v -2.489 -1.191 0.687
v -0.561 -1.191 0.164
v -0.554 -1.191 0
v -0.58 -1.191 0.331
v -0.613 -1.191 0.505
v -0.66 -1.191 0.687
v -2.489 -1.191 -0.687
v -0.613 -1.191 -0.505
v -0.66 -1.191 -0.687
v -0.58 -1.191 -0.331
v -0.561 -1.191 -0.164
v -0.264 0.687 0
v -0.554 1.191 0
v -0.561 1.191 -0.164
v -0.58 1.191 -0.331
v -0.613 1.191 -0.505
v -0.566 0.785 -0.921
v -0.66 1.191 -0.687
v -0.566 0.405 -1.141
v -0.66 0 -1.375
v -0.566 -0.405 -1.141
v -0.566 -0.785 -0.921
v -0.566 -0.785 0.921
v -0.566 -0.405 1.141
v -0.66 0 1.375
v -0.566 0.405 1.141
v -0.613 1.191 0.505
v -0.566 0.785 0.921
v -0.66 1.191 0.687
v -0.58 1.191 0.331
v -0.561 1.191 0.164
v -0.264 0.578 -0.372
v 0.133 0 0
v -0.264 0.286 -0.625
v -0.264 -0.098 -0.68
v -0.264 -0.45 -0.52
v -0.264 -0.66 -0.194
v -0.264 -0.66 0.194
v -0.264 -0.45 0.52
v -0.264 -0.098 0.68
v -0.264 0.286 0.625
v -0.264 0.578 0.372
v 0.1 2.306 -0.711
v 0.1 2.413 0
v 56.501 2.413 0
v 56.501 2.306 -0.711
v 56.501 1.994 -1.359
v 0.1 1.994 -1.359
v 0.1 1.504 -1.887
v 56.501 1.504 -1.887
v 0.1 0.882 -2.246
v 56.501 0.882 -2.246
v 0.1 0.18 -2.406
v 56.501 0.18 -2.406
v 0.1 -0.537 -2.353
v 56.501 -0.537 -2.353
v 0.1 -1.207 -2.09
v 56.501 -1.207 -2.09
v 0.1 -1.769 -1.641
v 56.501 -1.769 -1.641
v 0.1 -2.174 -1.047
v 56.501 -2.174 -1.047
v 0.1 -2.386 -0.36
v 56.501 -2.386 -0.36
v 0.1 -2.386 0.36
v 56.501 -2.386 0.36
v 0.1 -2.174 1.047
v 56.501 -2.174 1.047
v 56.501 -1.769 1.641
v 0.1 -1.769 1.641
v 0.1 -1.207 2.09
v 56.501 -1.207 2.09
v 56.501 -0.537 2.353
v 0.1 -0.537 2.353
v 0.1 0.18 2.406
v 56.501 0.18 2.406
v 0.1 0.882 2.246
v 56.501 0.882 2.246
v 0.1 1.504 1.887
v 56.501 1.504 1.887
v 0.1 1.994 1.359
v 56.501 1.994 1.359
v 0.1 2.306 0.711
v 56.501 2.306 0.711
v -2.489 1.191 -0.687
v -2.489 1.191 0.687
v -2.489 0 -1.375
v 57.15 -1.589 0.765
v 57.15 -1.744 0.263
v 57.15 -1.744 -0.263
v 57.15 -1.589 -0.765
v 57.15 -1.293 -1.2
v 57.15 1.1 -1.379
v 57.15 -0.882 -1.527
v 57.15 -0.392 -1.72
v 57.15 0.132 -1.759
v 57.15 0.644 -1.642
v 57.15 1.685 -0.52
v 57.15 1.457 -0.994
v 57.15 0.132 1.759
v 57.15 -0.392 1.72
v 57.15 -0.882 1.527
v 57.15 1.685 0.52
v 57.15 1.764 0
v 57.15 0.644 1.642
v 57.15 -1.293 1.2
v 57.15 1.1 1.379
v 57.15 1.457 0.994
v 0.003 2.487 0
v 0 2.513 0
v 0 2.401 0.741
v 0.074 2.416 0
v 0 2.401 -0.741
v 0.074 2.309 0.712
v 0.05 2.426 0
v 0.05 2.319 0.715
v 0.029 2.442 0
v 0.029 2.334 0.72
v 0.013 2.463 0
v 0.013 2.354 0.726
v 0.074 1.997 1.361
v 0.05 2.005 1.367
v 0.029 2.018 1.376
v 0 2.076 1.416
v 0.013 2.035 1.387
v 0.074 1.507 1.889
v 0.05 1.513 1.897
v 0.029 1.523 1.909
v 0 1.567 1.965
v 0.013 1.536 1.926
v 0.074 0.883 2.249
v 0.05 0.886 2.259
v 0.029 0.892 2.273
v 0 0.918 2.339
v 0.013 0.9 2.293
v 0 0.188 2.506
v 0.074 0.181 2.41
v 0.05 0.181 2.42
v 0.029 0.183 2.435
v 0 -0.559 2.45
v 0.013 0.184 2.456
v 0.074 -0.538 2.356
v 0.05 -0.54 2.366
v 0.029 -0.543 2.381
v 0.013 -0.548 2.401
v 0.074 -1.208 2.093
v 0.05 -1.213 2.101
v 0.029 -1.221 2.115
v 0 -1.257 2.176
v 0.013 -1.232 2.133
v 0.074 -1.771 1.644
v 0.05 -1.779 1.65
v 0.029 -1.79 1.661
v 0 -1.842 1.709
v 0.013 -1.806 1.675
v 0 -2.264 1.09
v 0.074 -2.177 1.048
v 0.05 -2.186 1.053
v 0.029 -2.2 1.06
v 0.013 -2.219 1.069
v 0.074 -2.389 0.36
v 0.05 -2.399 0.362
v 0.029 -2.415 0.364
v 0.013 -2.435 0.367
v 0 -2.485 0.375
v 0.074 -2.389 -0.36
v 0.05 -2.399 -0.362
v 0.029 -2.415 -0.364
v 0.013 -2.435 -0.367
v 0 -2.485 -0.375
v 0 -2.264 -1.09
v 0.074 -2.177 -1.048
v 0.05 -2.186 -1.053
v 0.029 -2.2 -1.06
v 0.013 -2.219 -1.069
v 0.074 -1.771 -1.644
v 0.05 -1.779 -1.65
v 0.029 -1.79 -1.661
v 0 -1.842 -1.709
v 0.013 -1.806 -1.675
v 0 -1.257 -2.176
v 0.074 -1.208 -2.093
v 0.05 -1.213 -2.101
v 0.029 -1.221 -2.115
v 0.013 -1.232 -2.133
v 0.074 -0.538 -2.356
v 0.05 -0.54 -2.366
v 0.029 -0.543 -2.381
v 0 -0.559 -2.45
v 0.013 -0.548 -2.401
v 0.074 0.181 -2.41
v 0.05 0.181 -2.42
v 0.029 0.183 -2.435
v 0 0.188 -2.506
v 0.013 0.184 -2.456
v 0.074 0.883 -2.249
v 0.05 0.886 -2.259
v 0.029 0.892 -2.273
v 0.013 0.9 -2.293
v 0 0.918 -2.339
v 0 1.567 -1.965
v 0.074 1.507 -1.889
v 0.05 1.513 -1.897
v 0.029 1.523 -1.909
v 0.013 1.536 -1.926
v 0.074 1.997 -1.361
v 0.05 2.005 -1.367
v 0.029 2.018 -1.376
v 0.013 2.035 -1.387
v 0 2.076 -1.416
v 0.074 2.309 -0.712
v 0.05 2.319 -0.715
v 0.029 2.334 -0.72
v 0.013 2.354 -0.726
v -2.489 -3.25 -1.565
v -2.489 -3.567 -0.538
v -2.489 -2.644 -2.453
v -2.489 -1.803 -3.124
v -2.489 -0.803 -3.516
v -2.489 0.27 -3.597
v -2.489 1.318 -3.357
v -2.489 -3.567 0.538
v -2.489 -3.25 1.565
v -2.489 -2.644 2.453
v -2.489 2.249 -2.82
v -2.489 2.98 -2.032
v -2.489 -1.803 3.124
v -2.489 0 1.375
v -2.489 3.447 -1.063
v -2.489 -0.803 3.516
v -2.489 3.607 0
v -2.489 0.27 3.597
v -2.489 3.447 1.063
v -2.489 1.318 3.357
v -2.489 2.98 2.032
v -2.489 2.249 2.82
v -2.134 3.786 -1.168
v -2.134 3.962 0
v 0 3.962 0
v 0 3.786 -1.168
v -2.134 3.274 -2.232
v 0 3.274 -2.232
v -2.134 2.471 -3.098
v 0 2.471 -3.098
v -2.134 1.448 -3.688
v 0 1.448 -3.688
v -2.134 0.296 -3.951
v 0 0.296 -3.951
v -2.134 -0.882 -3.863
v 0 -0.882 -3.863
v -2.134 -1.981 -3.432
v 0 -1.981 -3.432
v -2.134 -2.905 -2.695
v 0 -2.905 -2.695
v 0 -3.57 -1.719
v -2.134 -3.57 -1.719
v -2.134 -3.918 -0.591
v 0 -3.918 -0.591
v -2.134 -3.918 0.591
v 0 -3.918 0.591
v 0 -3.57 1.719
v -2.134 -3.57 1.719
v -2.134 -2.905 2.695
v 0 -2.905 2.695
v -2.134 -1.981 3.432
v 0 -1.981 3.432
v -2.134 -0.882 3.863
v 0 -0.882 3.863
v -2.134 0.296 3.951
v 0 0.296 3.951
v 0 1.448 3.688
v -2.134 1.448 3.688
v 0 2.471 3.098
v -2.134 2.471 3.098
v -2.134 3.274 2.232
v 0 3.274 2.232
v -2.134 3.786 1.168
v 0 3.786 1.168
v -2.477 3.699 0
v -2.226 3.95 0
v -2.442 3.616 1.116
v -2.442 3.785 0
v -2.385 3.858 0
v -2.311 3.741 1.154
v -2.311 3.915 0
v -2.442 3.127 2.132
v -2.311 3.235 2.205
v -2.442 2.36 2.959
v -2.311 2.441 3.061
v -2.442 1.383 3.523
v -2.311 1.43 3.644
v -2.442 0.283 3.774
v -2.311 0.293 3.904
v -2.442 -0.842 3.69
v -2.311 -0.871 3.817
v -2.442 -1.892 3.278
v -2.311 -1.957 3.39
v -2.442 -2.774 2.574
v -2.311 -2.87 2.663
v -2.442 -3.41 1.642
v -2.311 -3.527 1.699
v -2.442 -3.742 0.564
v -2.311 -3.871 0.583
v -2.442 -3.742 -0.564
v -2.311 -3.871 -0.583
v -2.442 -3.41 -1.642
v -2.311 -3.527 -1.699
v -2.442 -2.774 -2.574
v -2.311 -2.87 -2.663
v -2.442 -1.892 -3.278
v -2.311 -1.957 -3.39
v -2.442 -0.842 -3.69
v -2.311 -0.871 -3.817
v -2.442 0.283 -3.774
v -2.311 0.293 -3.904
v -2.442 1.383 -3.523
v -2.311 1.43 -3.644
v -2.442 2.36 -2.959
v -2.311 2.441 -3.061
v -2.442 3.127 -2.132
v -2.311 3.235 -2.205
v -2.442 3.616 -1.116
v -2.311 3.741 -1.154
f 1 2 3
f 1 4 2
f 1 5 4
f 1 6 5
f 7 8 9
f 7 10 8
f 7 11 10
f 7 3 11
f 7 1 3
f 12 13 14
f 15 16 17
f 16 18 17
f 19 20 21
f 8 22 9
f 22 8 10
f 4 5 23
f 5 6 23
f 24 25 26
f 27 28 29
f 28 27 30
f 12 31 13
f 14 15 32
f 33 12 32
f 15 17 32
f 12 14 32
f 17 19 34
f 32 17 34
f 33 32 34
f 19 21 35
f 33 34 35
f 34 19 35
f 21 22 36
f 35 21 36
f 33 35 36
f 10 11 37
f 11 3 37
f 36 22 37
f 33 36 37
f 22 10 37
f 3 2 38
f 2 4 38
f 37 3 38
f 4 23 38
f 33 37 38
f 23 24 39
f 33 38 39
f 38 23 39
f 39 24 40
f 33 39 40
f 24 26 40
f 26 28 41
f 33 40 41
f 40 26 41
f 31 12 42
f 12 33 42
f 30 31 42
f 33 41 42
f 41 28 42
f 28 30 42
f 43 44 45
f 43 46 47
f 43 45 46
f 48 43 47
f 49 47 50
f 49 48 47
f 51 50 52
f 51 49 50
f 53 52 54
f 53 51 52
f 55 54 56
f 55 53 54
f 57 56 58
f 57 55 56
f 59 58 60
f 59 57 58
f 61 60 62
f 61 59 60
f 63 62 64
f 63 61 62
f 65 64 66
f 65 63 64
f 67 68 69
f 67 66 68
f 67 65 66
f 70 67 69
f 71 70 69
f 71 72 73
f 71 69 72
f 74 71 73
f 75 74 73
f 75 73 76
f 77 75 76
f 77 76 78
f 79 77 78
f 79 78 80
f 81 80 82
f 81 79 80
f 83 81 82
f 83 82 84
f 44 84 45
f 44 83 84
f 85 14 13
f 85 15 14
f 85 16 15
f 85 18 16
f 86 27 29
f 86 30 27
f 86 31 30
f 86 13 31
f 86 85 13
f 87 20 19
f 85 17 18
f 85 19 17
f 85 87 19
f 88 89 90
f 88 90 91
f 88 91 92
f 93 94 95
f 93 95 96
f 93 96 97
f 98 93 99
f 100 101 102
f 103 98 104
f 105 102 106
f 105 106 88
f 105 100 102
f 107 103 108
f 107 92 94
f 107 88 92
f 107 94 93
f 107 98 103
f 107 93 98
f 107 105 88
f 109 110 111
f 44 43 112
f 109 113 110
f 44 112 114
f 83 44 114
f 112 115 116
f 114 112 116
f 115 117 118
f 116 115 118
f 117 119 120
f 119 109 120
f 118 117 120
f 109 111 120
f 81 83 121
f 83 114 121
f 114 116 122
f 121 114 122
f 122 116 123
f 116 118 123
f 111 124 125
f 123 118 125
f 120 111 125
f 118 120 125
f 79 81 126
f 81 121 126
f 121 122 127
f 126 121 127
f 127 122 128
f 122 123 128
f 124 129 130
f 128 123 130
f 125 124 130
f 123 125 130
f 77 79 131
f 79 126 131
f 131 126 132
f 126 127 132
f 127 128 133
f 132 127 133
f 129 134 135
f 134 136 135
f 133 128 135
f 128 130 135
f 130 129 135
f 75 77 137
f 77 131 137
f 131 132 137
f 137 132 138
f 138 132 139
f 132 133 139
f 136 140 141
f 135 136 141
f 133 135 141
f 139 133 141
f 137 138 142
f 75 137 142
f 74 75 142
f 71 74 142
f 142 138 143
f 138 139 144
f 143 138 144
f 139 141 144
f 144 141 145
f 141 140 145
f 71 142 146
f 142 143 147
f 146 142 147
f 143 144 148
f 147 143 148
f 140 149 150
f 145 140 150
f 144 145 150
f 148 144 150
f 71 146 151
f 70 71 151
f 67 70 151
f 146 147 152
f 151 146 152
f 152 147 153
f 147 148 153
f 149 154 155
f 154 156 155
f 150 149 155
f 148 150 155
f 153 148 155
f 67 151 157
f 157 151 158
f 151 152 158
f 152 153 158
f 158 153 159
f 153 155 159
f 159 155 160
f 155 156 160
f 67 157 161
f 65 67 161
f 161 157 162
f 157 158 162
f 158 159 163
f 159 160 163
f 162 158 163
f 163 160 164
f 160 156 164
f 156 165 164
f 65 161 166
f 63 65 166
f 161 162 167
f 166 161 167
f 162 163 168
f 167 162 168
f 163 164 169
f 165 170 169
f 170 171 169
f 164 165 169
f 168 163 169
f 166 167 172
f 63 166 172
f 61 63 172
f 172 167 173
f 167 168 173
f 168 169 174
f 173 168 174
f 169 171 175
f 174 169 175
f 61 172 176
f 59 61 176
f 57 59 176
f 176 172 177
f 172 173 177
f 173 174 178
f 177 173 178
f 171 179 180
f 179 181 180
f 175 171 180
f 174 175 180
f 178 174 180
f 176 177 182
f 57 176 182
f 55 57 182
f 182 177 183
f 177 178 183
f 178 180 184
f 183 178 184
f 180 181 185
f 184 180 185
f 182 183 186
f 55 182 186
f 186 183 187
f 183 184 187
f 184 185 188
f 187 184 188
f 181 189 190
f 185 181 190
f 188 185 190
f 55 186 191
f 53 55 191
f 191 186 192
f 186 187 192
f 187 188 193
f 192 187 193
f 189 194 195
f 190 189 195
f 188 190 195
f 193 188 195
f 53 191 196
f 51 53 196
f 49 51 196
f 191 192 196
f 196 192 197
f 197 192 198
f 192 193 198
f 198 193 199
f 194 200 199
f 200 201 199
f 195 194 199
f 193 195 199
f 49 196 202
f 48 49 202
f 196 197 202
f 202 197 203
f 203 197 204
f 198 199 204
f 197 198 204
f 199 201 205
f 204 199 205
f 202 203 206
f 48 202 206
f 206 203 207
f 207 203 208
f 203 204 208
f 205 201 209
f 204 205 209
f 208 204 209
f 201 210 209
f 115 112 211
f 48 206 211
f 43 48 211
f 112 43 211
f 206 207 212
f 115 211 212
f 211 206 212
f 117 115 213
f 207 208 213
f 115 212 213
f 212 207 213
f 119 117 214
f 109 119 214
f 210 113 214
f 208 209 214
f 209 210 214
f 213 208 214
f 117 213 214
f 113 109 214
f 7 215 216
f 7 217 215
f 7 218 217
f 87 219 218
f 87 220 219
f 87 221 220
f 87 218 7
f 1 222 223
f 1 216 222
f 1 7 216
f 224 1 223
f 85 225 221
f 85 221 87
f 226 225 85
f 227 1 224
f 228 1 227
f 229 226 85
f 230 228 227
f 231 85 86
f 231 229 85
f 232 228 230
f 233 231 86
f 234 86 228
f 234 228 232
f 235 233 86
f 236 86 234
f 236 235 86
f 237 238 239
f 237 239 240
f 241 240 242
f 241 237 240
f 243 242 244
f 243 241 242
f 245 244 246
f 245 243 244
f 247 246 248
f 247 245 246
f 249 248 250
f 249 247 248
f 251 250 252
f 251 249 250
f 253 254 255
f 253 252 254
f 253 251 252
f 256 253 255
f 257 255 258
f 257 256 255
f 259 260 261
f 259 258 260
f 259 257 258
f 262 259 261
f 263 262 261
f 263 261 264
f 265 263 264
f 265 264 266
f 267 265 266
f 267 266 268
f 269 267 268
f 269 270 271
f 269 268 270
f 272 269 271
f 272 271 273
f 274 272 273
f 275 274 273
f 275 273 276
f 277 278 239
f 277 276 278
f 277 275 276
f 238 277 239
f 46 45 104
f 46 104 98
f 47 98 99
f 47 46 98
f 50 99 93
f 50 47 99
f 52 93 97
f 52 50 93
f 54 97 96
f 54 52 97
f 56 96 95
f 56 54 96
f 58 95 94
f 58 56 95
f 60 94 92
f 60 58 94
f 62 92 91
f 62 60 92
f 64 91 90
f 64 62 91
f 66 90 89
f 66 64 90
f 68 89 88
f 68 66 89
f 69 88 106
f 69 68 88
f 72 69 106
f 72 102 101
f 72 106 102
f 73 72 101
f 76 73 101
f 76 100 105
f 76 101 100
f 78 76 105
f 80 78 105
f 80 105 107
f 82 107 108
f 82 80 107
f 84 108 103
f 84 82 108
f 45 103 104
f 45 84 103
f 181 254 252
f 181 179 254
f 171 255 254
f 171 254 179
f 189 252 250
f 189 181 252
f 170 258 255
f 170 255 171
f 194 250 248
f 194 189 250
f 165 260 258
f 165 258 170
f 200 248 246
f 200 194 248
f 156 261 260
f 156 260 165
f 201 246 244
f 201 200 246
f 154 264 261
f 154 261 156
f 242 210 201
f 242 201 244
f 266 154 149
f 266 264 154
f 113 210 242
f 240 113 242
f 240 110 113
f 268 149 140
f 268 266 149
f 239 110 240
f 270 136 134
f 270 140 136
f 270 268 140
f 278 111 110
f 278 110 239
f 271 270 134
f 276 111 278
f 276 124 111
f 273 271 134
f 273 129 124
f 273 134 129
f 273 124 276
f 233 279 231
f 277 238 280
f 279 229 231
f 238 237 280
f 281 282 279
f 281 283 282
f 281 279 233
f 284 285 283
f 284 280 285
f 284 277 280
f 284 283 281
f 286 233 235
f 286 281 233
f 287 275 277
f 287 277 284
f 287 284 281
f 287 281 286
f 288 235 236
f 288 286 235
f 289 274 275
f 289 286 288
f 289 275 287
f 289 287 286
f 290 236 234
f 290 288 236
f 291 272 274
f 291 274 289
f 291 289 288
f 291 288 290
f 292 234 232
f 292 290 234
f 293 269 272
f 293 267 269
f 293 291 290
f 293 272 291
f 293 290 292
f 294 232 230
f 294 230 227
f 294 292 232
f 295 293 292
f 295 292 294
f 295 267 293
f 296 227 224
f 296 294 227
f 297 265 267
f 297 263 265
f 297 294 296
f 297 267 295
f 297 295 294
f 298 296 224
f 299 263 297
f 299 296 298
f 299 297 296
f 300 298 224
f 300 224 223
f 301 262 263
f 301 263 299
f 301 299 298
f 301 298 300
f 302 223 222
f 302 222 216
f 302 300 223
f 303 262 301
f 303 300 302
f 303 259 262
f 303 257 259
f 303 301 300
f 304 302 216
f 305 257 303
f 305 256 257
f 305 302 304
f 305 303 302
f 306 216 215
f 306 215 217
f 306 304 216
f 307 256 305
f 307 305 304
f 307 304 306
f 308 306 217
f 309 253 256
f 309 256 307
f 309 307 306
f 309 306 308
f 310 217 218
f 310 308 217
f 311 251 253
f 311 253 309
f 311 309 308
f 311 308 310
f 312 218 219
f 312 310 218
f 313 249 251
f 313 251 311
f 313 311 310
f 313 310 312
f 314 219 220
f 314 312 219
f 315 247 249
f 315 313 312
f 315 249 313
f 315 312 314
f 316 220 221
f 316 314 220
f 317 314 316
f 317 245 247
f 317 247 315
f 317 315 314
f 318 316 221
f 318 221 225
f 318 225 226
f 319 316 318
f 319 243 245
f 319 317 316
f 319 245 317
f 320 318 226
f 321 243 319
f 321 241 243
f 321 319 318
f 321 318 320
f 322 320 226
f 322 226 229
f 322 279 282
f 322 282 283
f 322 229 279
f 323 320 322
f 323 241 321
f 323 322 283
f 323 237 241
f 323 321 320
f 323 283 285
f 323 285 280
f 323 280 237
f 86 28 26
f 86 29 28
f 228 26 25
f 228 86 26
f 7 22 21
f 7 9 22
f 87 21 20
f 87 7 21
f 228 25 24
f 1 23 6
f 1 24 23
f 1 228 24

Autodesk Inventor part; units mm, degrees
ref_plane "YZ Plane" through (0, 0, 0) normal (1, 0, 0) x (0, 1, 0)
ref_plane "XZ Plane" through (0, 0, 0) normal (0, 1, 0) x (-1, 0, 0)
sketch "Sketch1" plane through (0, 0, 0) normal (0, 0, 1) x (1, 0, 0)
  line L0 (0.1334, 0) -> (57.15, 0)
  line L1 (57.15, 0) -> (57.15, 2.413)
  line L2 (57.15, 2.413) -> (34.925, 2.413)
  line L3 (34.925, 2.413) -> (32.8082, 2.413)
  line L4 (32.8082, 2.413) -> (0, 2.413)
  line L5 (0, 2.413) -> (0, 3.9624)
  line L6 (0, 3.9624) -> (-2.4892, 3.9624)
  line L7 (-2.4892, 3.9624) -> (-2.4892, 1.3748)
  line L8 (-2.4892, 1.3748) -> (-0.6604, 1.3748)
  line L9 (-0.6604, 1.3748) -> (0.1334, 0)
  line L10 (-14.417, 0) -> (69.0778, 0) projected
  line L11 (0, -0.7925) -> (0, 4.7549) projected
  line L12 (34.925, 2.413) -> (0, 2.413) construction
  dimension "d1" = 22.225
  dimension "d2" = 2.1168
  dimension "d3" = 2.4892
  dimension "d4" = 1.8288
  dimension "d5" = 60
  dimension "d6" = 4.826
  dimension "d7" = 4.826
  dimension "d8" = 2.7496
  dimension "d9" = 7.9248
  dimension "d26" = 57.15
revolve "Body" add sketch "Sketch1" angle 360 about axis through (0.1334, 0, 0) along (1, 0, 0) contours L9 L11 L4 L3 L2 L1 L0 | L9 L8 L7 L6 L5 L11
sketch "Sketch2" plane through (-2.4892, 0, 0) normal (-1, 0, 0) x (0, 0, 1)
  circle A0 centre (0, 0) radius 1.3748 projected
  line L0 (0, -5.5474) -> (0, 5.5474) projected
  line L1 (-5.5474, 0) -> (5.5474, 0) projected
  line L2 (1.3748, 0) -> (0.6874, -1.1906)
  line L3 (0.6874, -1.1906) -> (-0.6874, -1.1906)
  line L4 (-0.6874, -1.1906) -> (-1.3748, 0)
  line L5 (-1.3748, 0) -> (-0.6874, 1.1906)
  line L6 (-0.6874, 1.1906) -> (0.6874, 1.1906)
  line L7 (0.6874, 1.1906) -> (1.3748, 0)
extrude "Slot" add sketch "Sketch2" against normal up to next contours L7 A0 | A0 L2 | L6 L0 A0 | A0 L0 L3 | L0 L6 A0 | A0 L3 L0 | L4 A0 | A0 L5
fillet "Fillet1" radius 0.3556 1 edges at (-2.4892, -3.9624, 0)
thread "Thread" size "10-24 UNC" class "2A" standard "ANSI Unified Screw Threads" length 22.225
chamfer "Chamfer1" distance 0.6492 distance2 0.6492 1 edges at (57.15, -2.413, 0) measured on face at (57.15, -0.4231, -0.1925)
ref_plane "Work Plane1" through (29, 0, 0) normal (0, -1, 0) x (1, 0, 0)
fillet "Fillet2" radius 0.1 1 edges at (0, -2.413, 0)
equation "\"d1\" = GEL"
equation "\"d3\" = KOH"
equation "\"d4\" = INTI"
equation "\"d6\" = GD"
equation "\"d7\" = BDM"
equation "\"d8\" = 1.1547 * SW"
equation "\"d9\" = KOD"
equation "\"d26\" = NLG"
equation "\"d30\" = R"
equation "\"d17\" = RR"
equation "\"d13\" = GEL"
equation "\"d15\" = -0.5 * SPD + 0.5 * GD"
equation "\"d16\" = GUL"
equation "\"GD\" = NND"
equation "\"NLG\" = 57.15"
equation "\"GEL\" = 22.225"
equation "\"KOD\" = 7.9248"
equation "\"KOH\" = 2.4892"
equation "\"INTI\" = 1.8288"
equation "\"GAL\" = 2.11668"
equation "\"GUL\" = 0.64922"
equation "\"BDM\" = NND"
equation "\"SW\" = 2.38125"
equation "\"RR\" = 0.3556"
equation "\"SPD\" = GD1"
equation "\"R\" = 0.1"
equation "\"PHH\" = 0.24892"
equation "\"THREADDIA\" = 4.826"
equation "\"FAWI\" = 45deg"
equation "\"NND\" = 4.826"
equation "\"E0\" = 1.155 * SW"
equation "\"FAWI1\" = 30deg"
equation "\"TOA\" = 30deg"
equation "\"GD1\" = 3.52755"
properties part number "Unbrako - 10 x 2 1/4" material "Steel, Mild"
